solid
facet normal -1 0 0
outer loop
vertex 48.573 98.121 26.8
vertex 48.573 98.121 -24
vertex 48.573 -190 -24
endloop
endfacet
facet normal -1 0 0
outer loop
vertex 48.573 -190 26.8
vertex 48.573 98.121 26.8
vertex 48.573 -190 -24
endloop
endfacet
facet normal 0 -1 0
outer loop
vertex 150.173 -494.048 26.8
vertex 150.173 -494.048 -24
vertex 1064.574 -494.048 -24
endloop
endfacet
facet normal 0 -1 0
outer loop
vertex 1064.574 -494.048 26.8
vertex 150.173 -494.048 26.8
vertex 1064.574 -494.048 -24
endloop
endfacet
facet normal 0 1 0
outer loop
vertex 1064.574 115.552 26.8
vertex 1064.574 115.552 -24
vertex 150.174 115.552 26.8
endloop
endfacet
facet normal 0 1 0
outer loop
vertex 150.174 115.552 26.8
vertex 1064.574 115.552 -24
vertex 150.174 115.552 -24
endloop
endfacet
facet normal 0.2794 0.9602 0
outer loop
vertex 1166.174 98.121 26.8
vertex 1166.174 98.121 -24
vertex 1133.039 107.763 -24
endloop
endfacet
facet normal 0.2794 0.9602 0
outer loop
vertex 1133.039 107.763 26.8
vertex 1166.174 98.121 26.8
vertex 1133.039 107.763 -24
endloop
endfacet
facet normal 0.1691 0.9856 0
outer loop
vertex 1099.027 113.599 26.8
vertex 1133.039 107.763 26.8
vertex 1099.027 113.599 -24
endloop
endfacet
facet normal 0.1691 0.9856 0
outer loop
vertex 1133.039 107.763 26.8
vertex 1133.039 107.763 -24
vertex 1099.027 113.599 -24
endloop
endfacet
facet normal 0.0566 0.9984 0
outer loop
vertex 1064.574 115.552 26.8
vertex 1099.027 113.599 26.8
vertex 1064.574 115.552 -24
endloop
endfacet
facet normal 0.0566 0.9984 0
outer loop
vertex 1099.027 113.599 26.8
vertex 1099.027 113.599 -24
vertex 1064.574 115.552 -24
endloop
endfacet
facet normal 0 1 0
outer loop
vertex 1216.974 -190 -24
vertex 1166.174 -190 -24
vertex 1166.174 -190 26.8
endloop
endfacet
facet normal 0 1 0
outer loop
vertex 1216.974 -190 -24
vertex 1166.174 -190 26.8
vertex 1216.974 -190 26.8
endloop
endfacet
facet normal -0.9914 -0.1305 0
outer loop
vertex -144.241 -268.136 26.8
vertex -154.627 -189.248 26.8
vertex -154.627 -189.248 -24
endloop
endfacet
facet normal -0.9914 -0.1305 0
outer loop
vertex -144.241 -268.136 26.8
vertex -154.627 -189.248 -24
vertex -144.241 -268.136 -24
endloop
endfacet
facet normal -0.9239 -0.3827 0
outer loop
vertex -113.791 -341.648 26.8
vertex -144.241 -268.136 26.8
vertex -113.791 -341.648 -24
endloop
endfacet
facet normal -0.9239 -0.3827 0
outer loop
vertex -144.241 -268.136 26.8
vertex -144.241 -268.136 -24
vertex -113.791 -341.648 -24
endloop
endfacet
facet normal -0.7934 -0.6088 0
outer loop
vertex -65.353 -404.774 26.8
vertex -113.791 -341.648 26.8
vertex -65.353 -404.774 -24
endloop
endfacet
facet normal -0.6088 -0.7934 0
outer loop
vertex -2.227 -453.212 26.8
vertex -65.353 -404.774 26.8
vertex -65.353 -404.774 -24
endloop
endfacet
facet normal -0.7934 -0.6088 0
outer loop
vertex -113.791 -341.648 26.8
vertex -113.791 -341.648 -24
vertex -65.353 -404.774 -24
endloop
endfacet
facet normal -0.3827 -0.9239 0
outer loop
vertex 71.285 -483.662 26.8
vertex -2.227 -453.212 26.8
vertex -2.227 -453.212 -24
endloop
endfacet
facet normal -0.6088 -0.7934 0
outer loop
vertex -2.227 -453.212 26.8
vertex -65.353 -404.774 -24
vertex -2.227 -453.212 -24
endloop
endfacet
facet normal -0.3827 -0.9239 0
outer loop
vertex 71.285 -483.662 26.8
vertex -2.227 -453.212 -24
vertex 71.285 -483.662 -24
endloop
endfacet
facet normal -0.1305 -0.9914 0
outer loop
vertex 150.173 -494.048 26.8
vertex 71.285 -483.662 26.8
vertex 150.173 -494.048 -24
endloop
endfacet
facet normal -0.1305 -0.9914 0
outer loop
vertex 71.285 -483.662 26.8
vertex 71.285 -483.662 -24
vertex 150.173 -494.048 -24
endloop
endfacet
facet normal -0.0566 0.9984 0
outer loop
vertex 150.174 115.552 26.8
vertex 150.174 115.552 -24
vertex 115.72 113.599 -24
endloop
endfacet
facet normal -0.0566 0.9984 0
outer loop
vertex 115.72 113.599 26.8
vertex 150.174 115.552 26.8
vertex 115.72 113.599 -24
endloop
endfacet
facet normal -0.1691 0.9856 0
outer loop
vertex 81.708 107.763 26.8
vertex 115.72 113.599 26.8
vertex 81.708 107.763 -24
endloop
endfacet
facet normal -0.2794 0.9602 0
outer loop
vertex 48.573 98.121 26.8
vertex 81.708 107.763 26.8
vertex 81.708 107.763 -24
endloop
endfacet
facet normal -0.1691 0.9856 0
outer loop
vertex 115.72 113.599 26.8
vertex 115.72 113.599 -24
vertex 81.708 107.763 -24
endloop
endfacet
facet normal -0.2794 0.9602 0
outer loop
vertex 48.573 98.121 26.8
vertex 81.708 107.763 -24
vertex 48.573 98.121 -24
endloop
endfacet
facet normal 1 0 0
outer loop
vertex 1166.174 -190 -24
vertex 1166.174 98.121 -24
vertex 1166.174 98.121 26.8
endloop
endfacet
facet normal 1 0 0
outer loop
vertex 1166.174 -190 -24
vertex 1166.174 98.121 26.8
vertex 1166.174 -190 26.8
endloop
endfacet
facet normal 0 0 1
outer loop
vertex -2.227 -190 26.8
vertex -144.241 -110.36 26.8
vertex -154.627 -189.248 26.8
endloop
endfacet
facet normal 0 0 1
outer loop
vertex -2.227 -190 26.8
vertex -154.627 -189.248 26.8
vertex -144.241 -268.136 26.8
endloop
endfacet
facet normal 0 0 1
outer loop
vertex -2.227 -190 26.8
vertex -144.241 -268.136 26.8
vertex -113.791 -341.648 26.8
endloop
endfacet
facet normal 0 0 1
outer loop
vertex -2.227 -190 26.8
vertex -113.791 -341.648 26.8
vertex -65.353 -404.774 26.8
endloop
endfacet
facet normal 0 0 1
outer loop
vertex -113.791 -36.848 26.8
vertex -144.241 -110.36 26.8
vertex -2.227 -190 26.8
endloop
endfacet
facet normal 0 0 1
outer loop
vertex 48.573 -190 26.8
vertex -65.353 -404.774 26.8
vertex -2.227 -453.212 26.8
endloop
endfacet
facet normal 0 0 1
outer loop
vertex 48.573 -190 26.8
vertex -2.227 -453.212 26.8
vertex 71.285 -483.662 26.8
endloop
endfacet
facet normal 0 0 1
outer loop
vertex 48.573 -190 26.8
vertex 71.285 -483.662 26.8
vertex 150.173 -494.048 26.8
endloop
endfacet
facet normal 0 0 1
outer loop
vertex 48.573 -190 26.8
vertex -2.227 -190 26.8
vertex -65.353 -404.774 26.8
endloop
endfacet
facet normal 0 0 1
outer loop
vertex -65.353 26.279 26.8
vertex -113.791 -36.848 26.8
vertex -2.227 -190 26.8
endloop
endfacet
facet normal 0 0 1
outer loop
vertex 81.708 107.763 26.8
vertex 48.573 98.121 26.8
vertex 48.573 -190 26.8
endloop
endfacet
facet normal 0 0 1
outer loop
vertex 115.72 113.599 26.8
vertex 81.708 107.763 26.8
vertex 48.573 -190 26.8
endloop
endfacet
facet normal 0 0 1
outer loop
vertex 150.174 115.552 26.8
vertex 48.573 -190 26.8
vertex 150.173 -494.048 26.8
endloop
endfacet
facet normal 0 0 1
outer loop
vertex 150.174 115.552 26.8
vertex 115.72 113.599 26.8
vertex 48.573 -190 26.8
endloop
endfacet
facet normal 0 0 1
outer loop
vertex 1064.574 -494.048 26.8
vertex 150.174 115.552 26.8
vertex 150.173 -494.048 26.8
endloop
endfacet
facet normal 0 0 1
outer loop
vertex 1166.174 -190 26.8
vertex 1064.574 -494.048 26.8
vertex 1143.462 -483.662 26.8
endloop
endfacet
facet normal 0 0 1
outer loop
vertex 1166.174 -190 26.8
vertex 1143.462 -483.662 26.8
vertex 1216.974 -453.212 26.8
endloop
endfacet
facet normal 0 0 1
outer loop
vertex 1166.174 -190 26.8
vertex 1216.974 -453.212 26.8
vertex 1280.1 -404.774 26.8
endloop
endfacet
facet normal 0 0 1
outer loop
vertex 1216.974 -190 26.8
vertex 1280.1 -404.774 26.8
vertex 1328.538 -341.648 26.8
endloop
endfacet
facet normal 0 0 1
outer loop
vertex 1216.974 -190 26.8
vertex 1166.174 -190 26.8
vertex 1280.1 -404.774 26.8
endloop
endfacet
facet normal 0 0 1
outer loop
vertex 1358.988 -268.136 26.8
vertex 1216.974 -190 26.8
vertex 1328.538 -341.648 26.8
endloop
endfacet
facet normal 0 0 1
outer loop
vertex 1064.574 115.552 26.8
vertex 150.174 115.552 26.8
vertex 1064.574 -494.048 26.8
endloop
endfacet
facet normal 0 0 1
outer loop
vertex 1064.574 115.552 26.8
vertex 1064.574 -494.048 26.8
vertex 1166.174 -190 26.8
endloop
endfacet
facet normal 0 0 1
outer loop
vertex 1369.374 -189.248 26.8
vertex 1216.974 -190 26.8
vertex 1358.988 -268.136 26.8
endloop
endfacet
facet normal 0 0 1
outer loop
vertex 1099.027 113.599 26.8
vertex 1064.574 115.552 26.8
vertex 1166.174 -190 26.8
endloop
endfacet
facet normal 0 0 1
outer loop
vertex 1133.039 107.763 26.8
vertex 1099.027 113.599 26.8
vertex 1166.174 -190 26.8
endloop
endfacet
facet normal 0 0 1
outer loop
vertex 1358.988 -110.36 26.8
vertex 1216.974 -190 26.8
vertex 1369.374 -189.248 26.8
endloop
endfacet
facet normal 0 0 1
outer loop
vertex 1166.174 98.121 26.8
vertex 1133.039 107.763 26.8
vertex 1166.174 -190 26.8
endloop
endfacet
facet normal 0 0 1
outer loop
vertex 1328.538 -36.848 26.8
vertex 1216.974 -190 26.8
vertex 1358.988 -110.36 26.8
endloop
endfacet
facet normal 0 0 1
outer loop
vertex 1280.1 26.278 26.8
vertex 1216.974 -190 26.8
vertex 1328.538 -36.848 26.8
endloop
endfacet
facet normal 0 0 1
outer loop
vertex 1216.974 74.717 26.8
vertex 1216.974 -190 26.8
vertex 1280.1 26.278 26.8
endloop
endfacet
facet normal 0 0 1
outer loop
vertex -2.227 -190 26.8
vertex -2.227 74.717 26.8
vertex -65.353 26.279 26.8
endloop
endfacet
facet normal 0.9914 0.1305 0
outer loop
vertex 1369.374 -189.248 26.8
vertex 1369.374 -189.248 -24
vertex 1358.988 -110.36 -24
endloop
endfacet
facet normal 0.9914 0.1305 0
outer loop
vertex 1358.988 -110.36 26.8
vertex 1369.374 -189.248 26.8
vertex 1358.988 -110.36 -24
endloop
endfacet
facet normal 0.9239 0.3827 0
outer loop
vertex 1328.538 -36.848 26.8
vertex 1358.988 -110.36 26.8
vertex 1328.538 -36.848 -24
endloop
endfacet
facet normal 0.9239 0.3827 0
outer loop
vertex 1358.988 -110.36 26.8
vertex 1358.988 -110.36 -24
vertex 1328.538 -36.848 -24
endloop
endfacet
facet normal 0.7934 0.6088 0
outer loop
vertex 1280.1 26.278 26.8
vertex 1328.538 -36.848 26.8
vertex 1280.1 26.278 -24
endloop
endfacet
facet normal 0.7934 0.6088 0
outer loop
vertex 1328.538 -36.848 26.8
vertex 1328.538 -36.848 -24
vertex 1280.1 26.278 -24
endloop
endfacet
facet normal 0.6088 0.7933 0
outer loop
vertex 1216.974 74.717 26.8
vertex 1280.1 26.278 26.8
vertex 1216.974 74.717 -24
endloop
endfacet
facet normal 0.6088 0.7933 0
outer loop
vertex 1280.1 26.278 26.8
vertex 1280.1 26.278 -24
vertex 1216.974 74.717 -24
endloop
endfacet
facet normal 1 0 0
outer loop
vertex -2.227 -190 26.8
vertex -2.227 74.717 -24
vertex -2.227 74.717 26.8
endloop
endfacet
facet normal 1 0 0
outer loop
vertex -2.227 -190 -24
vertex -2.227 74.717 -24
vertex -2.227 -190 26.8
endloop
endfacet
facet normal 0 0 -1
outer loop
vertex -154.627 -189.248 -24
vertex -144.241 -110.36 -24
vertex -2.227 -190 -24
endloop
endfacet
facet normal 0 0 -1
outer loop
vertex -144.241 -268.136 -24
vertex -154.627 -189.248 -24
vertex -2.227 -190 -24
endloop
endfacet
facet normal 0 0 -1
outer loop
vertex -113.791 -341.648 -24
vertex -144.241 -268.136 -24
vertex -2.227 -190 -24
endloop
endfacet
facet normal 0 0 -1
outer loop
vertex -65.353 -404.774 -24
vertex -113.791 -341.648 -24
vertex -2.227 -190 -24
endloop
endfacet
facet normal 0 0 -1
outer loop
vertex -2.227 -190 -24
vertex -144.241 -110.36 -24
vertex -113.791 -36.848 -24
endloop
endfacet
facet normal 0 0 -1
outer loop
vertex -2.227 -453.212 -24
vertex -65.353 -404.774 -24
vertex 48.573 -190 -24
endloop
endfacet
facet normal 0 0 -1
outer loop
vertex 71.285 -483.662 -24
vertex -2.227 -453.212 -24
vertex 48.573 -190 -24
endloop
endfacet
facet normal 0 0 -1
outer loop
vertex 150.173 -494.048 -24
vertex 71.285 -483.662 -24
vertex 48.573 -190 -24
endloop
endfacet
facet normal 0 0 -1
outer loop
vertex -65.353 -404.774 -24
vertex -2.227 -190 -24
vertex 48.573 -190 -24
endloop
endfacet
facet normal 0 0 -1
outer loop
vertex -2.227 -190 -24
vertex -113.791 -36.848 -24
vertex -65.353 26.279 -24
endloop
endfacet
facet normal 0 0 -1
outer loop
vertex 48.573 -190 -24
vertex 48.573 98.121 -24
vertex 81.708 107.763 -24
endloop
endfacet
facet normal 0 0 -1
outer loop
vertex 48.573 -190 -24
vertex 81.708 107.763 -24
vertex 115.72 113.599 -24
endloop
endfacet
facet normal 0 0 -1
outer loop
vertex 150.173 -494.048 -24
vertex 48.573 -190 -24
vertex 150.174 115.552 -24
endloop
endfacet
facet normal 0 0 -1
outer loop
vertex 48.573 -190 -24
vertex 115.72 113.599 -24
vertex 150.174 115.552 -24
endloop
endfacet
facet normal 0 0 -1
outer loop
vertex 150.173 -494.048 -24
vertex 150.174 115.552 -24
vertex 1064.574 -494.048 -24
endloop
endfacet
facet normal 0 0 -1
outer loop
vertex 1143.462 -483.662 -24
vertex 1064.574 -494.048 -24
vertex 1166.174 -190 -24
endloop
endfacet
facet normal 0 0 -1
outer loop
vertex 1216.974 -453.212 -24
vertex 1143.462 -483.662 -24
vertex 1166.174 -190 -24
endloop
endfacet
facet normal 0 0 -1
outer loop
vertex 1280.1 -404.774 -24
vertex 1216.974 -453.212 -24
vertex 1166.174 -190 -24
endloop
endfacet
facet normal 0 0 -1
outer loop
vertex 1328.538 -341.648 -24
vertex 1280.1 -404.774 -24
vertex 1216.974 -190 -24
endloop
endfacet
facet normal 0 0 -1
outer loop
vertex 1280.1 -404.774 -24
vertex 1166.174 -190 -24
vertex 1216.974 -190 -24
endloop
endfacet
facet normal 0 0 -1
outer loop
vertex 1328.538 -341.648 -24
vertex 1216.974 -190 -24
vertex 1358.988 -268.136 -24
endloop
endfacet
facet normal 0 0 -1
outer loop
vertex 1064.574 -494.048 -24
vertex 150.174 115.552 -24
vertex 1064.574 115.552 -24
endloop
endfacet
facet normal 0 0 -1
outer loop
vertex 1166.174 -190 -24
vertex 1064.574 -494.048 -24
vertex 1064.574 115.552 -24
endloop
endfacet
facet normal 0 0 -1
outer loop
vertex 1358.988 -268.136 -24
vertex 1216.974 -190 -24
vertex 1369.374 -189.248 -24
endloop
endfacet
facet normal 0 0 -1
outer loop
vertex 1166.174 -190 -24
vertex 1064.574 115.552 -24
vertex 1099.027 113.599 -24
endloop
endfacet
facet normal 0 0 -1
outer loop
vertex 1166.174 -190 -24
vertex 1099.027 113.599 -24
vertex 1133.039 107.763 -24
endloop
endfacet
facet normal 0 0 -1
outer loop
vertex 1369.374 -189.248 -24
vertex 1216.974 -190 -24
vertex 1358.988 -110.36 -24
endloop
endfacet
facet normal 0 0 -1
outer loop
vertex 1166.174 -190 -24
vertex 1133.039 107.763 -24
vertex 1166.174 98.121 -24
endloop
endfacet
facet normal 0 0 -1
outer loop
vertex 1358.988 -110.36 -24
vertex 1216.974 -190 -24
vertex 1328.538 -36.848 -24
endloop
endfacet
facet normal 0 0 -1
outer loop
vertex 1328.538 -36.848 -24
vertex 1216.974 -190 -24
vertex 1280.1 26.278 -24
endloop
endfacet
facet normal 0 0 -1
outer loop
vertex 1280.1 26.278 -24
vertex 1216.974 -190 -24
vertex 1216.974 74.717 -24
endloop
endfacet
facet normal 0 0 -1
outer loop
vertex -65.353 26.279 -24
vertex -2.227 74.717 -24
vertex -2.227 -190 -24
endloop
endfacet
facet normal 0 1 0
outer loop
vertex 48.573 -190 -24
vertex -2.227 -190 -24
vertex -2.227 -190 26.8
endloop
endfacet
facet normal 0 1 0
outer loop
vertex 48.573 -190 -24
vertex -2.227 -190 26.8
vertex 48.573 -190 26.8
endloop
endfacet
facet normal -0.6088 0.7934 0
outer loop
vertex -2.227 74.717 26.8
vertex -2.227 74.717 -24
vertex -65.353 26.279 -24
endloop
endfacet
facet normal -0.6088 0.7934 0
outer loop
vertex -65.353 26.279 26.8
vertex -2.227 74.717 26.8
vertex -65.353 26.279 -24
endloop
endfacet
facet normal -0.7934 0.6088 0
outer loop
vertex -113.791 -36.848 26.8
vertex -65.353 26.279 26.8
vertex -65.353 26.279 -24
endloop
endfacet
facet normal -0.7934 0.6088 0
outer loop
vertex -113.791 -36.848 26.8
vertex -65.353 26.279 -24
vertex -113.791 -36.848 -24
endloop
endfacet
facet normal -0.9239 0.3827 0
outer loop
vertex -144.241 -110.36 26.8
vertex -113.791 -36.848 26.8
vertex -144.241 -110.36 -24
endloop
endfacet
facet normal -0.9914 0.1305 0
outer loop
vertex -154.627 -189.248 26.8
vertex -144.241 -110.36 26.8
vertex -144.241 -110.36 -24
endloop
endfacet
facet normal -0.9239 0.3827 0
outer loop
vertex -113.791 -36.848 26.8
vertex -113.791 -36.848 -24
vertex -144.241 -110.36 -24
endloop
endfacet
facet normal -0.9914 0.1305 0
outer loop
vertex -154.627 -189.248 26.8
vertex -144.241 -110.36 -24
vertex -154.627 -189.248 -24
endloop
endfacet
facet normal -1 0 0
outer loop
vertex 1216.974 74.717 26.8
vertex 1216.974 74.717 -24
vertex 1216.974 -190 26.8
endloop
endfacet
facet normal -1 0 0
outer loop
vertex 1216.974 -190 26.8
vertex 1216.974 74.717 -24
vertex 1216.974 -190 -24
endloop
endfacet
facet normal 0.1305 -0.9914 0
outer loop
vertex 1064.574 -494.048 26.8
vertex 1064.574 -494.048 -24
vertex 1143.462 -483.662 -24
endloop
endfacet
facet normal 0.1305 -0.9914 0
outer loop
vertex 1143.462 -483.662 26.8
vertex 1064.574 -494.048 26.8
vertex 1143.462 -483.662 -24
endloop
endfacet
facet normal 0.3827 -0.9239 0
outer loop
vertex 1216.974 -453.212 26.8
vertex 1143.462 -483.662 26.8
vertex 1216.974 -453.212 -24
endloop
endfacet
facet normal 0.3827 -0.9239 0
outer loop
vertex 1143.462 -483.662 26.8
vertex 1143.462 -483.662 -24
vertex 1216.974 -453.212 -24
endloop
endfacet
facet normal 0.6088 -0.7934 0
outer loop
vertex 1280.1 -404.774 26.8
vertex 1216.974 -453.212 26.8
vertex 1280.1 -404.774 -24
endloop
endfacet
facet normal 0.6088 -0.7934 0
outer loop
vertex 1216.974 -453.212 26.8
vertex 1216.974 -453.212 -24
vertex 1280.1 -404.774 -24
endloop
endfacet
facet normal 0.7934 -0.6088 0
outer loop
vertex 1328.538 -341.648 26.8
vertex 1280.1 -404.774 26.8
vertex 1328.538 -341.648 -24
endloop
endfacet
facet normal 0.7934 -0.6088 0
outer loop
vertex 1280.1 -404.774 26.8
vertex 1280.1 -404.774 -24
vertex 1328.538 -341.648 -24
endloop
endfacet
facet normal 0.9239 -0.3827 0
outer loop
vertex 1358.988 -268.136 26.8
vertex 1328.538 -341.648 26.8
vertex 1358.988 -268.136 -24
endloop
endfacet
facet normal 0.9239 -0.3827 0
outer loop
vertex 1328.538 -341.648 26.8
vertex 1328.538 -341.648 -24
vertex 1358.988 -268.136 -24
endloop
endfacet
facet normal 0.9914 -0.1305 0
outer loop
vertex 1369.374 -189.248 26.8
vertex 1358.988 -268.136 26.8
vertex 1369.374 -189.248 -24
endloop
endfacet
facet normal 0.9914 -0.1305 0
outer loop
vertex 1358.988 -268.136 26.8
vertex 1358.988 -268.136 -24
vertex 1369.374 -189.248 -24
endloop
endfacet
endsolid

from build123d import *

# Parameters (mm, degrees)
PAD001_DEPTH = 50.8


with BuildPart() as part:
    # Sketch001 → Pad001 (new body)
    with BuildSketch(Plane.XY):
        with BuildLine():
            Line((-1503.823196, -304.048014), (-589.423152, -304.048014))
            ThreePointArc((-589.423152, -304.048014), (-373.896963, -214.774184), (-284.623087, 0.751986))
            ThreePointArc((-284.623087, 0.751986), (-325.458497, 153.151905), (-437.022924, 264.716435))
            Line((-437.022924, 264.716435), (-437.022924, 0))
            Line((-487.822924, 0), (-437.022924, 0))
            Line((-487.822924, 288.120125), (-487.822924, 0))
            ThreePointArc((-487.822924, 288.120125), (-537.880751, 301.162418), (-589.423152, 305.551986))
            Line((-589.423152, 305.551986), (-1503.823152, 305.551986))
            ThreePointArc((-1503.823152, 305.551986), (-1555.365469, 301.162433), (-1605.423218, 288.120182))
            Line((-1605.423218, 288.120182), (-1605.423218, 0))
            Line((-1656.223218, 0), (-1605.423218, 0))
            Line((-1656.223218, 264.716529), (-1656.223218, 0))
            ThreePointArc((-1656.223218, 264.716529), (-1767.787761, 153.151986), (-1808.623218, 0.751986))
            ThreePointArc((-1808.623218, 0.751986), (-1719.349357, -214.774168), (-1503.823196, -304.048014))
        make_face()
    extrude(amount=PAD001_DEPTH)


with BuildPart() as part_1:
    # Body001 placement: moved
    add(part.part.moved(Location((1653.996692, -189.99962, -23.999952))))


solid = part_1.part
